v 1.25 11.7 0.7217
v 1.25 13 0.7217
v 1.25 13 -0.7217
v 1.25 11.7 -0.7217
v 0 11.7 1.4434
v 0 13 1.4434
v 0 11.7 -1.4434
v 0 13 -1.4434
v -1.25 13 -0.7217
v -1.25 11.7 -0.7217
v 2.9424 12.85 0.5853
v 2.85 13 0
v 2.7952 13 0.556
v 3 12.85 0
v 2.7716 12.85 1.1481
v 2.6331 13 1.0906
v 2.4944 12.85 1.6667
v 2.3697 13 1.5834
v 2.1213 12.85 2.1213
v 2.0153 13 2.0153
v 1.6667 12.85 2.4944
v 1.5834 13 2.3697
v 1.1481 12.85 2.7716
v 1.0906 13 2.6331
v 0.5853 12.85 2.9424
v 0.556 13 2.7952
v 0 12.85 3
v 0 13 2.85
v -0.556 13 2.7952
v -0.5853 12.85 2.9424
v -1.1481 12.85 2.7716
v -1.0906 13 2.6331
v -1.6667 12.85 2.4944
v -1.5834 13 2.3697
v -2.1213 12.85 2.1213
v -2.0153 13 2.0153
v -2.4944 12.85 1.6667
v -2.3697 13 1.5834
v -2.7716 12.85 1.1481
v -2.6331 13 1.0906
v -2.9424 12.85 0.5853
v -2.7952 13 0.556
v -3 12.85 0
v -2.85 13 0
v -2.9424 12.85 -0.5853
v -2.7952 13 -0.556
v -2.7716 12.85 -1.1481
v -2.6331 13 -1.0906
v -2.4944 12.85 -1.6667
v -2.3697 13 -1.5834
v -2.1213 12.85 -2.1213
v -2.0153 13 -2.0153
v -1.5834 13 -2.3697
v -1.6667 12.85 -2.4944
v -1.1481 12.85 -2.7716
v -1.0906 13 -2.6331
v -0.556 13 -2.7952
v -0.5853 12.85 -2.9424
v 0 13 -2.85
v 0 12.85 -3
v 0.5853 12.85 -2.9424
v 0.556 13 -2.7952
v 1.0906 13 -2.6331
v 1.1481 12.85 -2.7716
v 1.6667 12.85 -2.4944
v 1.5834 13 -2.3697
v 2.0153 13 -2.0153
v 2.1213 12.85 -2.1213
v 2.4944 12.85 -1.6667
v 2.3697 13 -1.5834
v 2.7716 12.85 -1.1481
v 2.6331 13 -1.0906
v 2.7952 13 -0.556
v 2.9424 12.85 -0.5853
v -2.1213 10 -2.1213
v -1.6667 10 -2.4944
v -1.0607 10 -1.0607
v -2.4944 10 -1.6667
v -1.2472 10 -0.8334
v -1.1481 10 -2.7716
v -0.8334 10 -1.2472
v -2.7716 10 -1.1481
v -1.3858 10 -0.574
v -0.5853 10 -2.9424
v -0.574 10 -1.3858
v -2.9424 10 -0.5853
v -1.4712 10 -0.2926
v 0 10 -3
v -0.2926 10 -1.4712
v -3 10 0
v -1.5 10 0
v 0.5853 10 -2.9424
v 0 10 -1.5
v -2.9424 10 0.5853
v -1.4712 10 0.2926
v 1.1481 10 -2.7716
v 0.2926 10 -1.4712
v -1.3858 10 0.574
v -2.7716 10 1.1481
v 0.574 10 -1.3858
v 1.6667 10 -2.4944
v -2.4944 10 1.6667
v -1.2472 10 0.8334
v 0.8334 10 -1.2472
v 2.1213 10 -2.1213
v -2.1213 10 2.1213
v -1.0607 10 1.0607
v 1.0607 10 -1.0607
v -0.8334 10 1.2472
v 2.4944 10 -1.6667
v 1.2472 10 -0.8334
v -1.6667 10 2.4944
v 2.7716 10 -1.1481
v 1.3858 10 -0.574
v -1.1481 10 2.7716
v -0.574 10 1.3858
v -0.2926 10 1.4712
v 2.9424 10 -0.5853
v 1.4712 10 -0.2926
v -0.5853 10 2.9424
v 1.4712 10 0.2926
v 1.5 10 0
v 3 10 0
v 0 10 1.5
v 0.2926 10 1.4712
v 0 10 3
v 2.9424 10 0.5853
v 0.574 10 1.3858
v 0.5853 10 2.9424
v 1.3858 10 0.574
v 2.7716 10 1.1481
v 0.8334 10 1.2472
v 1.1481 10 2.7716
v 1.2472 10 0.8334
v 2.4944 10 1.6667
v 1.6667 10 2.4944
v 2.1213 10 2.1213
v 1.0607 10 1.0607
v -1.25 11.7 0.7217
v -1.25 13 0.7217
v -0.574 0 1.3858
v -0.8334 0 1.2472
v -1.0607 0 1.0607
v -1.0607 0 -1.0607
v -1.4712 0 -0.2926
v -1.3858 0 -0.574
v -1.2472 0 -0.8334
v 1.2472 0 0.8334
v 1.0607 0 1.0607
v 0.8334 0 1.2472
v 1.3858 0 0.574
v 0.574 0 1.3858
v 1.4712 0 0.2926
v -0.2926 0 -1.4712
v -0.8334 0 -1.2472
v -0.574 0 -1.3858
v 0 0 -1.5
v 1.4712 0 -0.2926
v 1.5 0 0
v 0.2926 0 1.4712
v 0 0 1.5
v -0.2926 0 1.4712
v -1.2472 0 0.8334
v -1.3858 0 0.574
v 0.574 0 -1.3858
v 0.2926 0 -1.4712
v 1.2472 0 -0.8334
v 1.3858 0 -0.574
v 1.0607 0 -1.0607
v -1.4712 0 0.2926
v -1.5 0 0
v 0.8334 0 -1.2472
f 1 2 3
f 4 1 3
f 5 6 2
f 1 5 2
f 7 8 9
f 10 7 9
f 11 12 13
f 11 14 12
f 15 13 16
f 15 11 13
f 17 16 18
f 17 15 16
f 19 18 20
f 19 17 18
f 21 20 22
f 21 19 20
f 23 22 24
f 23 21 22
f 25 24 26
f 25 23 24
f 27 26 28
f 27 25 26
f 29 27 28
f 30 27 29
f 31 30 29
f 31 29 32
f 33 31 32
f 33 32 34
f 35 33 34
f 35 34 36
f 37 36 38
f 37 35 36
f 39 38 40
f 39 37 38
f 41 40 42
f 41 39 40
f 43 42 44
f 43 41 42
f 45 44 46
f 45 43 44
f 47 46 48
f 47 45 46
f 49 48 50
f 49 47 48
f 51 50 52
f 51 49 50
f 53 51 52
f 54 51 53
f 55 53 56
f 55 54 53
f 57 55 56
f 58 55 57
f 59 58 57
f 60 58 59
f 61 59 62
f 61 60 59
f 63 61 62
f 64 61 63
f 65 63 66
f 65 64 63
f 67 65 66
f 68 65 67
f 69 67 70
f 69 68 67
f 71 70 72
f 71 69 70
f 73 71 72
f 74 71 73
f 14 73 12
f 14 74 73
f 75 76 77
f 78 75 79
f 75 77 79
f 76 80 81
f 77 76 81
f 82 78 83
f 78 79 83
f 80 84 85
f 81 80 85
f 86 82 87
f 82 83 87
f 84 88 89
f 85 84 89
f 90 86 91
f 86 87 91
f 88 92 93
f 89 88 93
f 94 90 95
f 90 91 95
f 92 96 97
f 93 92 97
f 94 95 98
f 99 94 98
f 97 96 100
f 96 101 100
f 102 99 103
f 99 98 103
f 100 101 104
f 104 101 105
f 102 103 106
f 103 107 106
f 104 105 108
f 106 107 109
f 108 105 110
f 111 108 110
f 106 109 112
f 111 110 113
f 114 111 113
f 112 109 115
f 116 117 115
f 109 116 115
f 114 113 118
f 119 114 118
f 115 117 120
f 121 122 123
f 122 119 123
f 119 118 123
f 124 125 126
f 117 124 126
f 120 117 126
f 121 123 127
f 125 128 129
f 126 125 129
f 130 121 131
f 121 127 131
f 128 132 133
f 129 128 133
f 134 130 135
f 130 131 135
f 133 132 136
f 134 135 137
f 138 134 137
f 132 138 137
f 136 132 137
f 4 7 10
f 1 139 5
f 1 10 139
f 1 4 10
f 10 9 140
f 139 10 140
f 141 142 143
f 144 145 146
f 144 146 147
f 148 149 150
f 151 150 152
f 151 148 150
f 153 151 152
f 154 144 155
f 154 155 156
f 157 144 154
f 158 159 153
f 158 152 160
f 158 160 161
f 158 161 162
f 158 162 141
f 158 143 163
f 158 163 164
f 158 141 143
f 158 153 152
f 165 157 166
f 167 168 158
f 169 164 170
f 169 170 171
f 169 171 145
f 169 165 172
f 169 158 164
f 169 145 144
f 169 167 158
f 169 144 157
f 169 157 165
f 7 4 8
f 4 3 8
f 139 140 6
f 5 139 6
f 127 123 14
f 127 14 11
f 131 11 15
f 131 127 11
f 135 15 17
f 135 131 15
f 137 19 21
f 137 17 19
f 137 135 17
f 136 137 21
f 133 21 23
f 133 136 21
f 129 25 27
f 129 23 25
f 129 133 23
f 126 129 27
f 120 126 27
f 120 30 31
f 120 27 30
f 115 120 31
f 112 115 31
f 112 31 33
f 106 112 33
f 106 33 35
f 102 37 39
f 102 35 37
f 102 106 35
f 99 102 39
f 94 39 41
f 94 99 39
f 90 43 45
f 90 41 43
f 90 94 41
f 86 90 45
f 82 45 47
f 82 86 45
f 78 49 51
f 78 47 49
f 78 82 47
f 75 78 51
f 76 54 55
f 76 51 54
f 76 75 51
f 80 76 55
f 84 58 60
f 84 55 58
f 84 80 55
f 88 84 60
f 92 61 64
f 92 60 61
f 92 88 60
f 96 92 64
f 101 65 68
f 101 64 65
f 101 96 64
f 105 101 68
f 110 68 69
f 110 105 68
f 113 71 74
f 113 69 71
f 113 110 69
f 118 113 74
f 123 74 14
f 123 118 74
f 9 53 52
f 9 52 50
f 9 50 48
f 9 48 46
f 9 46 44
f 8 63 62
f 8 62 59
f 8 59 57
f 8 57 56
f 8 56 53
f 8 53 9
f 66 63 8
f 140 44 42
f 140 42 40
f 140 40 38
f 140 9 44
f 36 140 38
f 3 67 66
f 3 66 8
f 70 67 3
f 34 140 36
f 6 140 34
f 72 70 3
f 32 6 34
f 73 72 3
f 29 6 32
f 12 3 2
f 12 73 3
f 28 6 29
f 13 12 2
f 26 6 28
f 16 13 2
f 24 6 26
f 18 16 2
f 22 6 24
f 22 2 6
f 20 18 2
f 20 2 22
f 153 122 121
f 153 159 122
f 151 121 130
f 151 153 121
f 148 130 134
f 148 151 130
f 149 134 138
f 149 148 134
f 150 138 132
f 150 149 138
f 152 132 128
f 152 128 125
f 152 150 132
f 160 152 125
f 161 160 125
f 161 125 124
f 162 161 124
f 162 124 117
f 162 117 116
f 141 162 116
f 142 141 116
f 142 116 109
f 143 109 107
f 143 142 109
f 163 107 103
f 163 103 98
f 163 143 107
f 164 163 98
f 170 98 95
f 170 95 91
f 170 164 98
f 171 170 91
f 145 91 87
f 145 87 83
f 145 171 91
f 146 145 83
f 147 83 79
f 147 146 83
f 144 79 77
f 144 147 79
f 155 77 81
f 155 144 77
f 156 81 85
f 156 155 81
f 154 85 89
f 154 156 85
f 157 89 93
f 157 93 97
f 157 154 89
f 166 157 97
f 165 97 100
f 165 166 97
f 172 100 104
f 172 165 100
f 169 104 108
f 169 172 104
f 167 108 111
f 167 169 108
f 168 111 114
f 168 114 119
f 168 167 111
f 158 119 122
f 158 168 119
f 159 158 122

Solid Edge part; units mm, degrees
sketch "Sketch1" plane through (0, 0, 0) normal (0, -1, 0) x (1, 0, 0)
  circle A0 centre (0, 0) radius 1.5
extrude "Protrusion1" add sketch "Sketch1" against normal blind 10
sketch "Sketch2" plane through (0, 10, 0) normal (0, 1, 0) x (1, 0, 0)
  circle A0 centre (0, 0) radius 3
extrude "ExtrudedProtrusion_2" add sketch "Sketch2" along normal blind 3
sketch "Sketch3" plane through (0, 13, 0) normal (0, 1, 0) x (-1, 0, 0)
  line L0 (1.25, -0.7217) -> (1.25, 0.7217)
  line L1 (1.25, 0.7217) -> (0, 1.4434)
  line L2 (0, 1.4434) -> (-1.25, 0.7217)
  line L3 (-1.25, 0.7217) -> (-1.25, -0.7217)
  line L4 (-1.25, -0.7217) -> (0, -1.4434)
  line L5 (0, -1.4434) -> (1.25, -0.7217)
  dimension "D1" = 2.5
extrude "ExtrudedCutout_2" cut sketch "Sketch3" against normal blind 1.3
chamfer "Chamfer_1" distance 0.15 angle 45 1 edges at (-3, 13, 0)
properties material "Nylon, general purpose"
